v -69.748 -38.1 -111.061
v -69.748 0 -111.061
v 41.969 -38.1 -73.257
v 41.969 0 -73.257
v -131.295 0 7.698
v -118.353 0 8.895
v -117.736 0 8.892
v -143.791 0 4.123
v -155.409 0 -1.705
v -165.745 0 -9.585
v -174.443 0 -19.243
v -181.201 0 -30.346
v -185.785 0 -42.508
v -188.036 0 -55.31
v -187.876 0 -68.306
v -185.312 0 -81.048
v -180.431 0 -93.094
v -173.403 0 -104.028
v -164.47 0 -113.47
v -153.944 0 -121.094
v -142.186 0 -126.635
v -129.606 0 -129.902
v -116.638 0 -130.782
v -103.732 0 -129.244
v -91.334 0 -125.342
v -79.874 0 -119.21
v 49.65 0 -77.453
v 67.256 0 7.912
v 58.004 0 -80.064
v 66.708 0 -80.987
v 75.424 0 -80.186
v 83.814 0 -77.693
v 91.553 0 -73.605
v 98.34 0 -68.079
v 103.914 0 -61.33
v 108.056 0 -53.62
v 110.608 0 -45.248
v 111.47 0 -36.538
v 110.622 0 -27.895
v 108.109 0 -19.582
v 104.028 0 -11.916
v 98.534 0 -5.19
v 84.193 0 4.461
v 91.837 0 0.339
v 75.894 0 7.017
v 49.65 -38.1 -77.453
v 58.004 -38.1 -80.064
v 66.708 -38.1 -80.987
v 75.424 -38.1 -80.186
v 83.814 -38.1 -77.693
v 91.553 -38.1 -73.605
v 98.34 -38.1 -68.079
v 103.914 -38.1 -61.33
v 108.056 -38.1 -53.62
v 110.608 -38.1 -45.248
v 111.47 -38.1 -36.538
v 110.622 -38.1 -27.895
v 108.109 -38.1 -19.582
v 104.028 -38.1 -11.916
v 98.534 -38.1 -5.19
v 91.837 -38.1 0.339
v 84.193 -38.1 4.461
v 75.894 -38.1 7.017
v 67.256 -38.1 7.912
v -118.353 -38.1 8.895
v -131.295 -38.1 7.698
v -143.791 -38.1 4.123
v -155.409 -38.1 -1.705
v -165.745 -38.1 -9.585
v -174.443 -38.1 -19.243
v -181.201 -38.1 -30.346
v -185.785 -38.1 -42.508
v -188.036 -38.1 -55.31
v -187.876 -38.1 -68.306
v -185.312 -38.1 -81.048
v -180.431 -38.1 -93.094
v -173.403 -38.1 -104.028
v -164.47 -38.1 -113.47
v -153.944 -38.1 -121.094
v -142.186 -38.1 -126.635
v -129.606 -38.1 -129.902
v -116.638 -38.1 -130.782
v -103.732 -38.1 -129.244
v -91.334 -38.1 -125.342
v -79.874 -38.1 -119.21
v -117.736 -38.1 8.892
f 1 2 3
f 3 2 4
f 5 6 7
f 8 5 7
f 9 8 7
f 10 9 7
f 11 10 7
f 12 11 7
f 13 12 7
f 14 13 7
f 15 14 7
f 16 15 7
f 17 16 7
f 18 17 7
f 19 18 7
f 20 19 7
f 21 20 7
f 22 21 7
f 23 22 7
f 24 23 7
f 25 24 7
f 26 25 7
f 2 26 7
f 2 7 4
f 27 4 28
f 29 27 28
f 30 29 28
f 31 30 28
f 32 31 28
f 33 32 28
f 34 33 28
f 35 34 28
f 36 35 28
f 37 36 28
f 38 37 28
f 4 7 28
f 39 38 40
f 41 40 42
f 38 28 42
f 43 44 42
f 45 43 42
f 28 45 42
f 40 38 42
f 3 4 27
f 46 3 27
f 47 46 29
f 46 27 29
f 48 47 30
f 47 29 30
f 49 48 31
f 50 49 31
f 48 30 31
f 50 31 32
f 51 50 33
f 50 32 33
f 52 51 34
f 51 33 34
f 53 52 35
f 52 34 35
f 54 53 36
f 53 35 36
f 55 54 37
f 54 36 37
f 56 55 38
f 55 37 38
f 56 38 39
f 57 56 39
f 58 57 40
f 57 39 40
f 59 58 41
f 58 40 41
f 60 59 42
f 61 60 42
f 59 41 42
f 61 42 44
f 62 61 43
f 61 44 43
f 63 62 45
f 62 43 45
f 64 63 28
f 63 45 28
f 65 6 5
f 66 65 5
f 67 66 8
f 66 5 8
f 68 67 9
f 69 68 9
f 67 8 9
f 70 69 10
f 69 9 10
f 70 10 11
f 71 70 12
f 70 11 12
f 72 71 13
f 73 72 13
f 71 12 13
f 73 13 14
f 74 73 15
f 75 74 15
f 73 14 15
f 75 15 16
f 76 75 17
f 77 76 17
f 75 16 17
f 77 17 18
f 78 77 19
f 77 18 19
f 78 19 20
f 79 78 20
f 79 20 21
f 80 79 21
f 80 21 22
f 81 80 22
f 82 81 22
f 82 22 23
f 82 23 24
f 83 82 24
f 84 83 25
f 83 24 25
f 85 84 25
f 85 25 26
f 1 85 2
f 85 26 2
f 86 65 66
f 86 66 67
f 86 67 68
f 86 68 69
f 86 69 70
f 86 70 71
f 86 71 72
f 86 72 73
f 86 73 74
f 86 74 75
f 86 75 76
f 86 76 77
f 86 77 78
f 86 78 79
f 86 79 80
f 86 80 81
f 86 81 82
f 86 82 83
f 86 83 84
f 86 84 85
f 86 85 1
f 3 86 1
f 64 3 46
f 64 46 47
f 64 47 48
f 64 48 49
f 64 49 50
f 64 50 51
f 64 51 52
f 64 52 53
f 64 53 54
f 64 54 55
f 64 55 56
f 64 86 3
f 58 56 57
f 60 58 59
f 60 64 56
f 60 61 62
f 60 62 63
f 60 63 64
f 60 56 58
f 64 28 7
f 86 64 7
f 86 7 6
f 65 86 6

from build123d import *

# Parameters (mm, degrees)
F1_DEPTH = 38.1


with BuildPart() as f1:
    # F0 (on Front) → F1 (new body)
    with BuildSketch(Plane.XZ):
        with BuildLine():
            ThreePointArc((-48.564447, -60.954478), (-54.078042, -88.154653), (-69.748399, -111.060748))
            Line((-69.748399, -111.060748), (41.969208, -73.256539))
            ThreePointArc((41.969208, -73.256539), (24.58164, -23.316982), (67.255602, 7.911527))
            Line((67.255602, 7.911527), (-117.735768, 8.892225))
            ThreePointArc((-117.735768, 8.892225), (-68.783669, -11.803604), (-48.564447, -60.954478))
        make_face()
        with BuildLine():
            Line((-117.735768, 8.892225), (-118.352549, 8.895495))
            ThreePointArc((-118.352549, 8.895495), (-183.152212, -87.185076), (-69.748399, -111.060748))
            ThreePointArc((-69.748399, -111.060748), (-54.078042, -88.154653), (-48.564447, -60.954478))
            ThreePointArc((-48.564447, -60.954478), (-68.783669, -11.803604), (-117.735768, 8.892225))
        make_face()
        with BuildLine():
            ThreePointArc((67.255602, 7.911527), (24.58164, -23.316982), (41.969208, -73.256539))
            ThreePointArc((41.969208, -73.256539), (87.784071, -75.839938), (111.469962, -36.537848))
            ThreePointArc((111.469962, -36.537848), (98.53406, -5.190374), (67.255602, 7.911527))
        make_face()
    extrude(amount=F1_DEPTH)


solid = f1.part
